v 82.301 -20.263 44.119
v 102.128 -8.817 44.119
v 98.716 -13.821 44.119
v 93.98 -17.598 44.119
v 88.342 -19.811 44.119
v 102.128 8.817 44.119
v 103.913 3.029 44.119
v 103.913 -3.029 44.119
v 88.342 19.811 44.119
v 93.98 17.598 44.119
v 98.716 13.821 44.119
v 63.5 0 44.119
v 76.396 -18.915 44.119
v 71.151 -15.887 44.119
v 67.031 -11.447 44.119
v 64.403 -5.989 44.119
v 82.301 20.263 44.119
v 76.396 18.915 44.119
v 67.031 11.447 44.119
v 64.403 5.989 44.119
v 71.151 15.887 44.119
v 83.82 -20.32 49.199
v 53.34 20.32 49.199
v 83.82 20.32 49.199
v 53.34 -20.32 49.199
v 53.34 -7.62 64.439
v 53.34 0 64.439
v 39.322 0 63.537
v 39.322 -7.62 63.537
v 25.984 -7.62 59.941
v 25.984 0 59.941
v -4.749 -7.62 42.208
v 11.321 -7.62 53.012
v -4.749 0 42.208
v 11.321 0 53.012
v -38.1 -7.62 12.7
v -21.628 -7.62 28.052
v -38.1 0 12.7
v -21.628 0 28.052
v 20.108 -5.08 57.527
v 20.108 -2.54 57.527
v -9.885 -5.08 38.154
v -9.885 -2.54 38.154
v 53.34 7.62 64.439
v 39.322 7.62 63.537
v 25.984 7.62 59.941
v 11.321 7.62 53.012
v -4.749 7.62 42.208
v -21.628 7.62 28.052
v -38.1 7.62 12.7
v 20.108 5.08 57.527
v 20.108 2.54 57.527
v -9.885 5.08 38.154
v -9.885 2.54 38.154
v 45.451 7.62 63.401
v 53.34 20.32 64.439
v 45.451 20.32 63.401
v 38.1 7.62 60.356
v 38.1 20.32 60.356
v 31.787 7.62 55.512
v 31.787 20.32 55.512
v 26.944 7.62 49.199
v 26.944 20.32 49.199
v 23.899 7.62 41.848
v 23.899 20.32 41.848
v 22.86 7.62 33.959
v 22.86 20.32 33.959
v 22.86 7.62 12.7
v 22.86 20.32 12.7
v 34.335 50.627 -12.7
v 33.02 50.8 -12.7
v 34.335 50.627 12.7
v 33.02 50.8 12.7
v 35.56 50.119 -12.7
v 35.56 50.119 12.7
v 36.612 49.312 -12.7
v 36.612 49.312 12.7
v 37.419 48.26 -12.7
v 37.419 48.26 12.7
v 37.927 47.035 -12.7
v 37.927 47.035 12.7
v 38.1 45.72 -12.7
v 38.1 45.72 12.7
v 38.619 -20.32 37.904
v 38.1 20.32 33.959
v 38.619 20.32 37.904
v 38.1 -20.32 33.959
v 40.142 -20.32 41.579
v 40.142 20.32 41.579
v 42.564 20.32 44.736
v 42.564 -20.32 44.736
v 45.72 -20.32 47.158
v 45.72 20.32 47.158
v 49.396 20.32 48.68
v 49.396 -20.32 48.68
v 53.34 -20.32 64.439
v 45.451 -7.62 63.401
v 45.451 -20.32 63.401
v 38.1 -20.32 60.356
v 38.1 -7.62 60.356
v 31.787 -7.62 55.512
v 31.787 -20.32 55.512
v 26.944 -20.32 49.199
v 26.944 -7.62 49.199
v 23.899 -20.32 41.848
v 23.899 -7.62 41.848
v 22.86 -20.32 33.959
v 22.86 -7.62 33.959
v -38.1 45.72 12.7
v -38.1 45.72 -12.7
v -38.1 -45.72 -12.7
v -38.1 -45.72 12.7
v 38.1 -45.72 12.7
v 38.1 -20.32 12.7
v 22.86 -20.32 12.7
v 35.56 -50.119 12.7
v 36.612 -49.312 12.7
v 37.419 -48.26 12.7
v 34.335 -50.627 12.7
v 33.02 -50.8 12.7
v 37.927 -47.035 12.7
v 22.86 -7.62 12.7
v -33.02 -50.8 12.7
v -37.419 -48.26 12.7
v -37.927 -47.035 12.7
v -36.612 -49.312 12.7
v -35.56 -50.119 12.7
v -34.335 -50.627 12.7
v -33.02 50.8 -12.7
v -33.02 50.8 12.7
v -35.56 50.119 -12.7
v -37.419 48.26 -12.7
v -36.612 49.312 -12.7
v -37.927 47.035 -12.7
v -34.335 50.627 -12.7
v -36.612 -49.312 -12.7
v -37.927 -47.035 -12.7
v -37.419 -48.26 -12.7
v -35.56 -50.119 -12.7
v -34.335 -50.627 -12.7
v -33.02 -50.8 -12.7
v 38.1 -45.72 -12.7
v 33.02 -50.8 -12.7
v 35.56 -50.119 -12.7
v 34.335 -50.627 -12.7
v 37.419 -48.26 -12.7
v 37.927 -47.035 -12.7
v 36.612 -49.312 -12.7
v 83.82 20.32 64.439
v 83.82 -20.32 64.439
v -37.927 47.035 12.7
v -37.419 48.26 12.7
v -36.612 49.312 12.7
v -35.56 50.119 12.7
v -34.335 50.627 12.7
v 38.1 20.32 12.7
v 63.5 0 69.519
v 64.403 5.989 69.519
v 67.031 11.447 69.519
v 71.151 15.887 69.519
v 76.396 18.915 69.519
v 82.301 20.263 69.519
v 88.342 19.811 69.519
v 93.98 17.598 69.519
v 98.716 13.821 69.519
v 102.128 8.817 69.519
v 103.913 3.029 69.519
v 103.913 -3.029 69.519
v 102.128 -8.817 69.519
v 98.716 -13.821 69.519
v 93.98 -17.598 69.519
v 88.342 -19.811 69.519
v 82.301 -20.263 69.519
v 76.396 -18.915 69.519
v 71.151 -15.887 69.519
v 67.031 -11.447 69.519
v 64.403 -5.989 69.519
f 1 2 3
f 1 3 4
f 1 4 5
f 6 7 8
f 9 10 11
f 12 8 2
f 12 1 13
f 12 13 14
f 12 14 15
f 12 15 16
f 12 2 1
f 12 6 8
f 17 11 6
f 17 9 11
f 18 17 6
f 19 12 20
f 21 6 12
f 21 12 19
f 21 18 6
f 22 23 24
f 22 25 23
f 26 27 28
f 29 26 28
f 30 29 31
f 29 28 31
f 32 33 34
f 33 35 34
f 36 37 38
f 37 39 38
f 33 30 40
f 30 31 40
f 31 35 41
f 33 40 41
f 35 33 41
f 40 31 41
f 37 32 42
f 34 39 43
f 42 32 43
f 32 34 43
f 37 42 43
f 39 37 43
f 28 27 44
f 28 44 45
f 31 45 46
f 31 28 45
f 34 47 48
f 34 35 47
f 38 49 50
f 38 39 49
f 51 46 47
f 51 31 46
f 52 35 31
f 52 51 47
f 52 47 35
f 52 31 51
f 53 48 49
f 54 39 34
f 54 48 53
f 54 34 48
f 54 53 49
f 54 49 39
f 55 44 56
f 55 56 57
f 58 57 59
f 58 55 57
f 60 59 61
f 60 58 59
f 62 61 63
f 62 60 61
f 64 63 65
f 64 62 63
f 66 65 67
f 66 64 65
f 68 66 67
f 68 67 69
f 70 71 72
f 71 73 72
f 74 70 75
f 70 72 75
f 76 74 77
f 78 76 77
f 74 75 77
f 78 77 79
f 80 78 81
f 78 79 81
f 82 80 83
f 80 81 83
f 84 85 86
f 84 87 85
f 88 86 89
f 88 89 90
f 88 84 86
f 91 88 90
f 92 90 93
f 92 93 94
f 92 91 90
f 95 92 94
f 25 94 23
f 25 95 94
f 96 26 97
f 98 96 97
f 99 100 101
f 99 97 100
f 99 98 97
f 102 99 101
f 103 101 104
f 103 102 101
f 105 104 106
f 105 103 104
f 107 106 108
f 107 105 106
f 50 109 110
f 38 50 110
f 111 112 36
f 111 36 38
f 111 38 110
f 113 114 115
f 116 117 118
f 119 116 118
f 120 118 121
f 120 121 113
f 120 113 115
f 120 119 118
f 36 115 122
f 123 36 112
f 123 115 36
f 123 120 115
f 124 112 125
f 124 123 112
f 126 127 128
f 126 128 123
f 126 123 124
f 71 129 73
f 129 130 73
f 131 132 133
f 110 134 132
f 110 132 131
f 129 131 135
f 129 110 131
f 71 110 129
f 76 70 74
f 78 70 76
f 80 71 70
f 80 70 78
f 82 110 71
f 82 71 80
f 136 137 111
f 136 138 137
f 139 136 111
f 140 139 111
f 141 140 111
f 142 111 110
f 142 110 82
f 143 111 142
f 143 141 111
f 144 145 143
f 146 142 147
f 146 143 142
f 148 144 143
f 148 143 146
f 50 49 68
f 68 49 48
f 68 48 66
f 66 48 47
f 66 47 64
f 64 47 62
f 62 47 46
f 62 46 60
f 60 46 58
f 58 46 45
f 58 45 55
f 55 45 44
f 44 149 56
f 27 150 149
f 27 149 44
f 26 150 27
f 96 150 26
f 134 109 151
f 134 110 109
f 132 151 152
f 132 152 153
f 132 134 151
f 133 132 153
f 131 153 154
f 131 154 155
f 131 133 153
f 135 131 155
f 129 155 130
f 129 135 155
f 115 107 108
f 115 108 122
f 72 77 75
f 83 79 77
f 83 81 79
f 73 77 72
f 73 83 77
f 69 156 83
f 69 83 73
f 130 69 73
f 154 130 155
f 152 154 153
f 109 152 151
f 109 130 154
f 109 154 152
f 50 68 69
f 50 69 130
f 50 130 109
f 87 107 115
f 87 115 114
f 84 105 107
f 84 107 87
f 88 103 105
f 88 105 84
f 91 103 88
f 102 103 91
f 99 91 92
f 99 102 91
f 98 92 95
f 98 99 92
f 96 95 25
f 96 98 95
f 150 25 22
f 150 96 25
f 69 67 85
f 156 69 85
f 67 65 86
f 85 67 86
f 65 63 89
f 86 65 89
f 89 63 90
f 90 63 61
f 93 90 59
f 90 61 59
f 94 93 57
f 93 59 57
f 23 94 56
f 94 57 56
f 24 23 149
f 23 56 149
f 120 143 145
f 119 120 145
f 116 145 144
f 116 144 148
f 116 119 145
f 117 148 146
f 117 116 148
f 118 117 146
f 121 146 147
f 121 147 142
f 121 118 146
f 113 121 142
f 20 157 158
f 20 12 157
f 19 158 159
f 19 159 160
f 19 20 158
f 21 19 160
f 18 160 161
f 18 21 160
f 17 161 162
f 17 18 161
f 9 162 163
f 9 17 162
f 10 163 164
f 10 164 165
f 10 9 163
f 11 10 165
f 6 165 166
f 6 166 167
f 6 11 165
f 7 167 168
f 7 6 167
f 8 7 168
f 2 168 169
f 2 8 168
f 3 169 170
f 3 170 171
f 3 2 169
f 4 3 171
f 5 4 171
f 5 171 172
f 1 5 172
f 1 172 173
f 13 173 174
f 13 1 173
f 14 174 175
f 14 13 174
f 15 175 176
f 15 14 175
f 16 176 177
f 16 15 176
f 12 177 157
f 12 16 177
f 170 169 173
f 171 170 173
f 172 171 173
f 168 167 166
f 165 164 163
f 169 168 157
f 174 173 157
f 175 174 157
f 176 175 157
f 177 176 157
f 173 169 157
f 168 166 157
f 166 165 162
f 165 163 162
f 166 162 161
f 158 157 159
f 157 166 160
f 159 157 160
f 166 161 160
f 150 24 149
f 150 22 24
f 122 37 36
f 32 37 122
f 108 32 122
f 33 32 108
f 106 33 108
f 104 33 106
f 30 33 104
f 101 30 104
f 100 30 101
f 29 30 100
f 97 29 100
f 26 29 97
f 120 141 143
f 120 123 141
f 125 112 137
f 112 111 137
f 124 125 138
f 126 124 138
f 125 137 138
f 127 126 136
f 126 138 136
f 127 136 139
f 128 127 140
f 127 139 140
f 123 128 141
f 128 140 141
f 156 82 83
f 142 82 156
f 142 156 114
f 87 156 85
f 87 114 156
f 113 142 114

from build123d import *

# Parameters (mm, degrees)
F0_W          = 20.32
F0_H          = 15.24000009
F0_H_2        = 5.07999991
F0_H_3        = 5.08
F2_DEPTH      = 50.8
F2_DEPTH_BACK = 50.8
F3_DEPTH      = 20.32
F3_DEPTH_BACK = 20.32
F4_DEPTH      = 7.62
F4_DEPTH_BACK = 7.62
F5_R          = 5.08


with BuildPart() as f1:
    # F0 (on Front) → F1 (revolve)
    with BuildSketch(Plane.XZ):
        with Locations((73.66, 56.8193151802)):
            Rectangle(F0_W, F0_H)
        with Locations((73.66, 66.9793151802)):
            Rectangle(F0_W, F0_H_2)
        with Locations((73.66, 46.6593151352)):
            Rectangle(F0_W, F0_H_3)
    revolve(axis=Axis((83.82, 0, 63.1609670818), (0, 0, -1)))


with BuildPart() as f2:
    # F0 (on Front) → F2 (new body, two sides)
    with BuildSketch(Plane.XZ) as f2_sk:
        Polygon((-38.1, -12.7), (38.1, -12.7), (38.1, 12.7), (22.85999991, 12.7), (-38.1, 12.7), align=None)
    extrude(amount=F2_DEPTH)
    extrude(f2_sk.sketch, amount=-F2_DEPTH_BACK)

    # F0 (on Front) → F3 (join, two sides)
    with BuildSketch(Plane.XZ) as f3_sk:
        with Locations((73.66, 56.8193151802)):
            Rectangle(F0_W, F0_H)
        with BuildLine():
            Line((22.85999991, 12.7), (38.1, 12.7))
            Line((38.1, 12.7), (38.1, 33.9593151352))
            ThreePointArc((38.1, 33.9593151352), (42.5636926547, 44.7356224805), (53.34, 49.1993151352))
            Line((53.34, 49.1993151352), (63.5, 49.1993151352))
            Line((63.5, 49.1993151352), (63.5, 64.4393152252))
            Line((63.5, 64.4393152252), (53.34, 64.4393152252))
            ThreePointArc((53.34, 64.4393152252), (31.7873852458, 55.5119298894), (22.85999991, 33.9593151352))
            Line((22.85999991, 33.9593151352), (22.85999991, 12.7))
        make_face()
    extrude(amount=F3_DEPTH)
    extrude(f3_sk.sketch, amount=-F3_DEPTH_BACK)

    # F0 (on Front) → F4 (join, two sides)
    with BuildSketch(Plane.XZ) as f4_sk:
        with BuildLine():
            add(Edge.make_bspline(
                [(53.34, 64.4393152252), (18.0031490481, 65.8844992586), (-10.2887663049, 39.0674972777), (-38.1, 12.7)],
                knots=[0, 0, 0, 0, 105.0629827293, 105.0629827293, 105.0629827293, 105.0629827293], degree=3))
            Line((-38.1, 12.7), (22.85999991, 12.7))
            Line((22.85999991, 12.7), (22.85999991, 33.9593151352))
            ThreePointArc((22.85999991, 33.9593151352), (31.7873852458, 55.5119298894), (53.34, 64.4393152252))
        make_face()
    extrude(amount=F4_DEPTH)
    extrude(f4_sk.sketch, amount=-F4_DEPTH_BACK)

    # F5
    f5_edges = [f2.edges().sort_by_distance(p)[0] for p in [
        (-38.1, -50.8, 0),
        (38.1, -50.8, 0),
        (-38.1, 50.8, 0),
        (38.1, 50.8, 0),
    ]]
    fillet(f5_edges, radius=F5_R)


solid = Compound([f1.part, f2.part])
